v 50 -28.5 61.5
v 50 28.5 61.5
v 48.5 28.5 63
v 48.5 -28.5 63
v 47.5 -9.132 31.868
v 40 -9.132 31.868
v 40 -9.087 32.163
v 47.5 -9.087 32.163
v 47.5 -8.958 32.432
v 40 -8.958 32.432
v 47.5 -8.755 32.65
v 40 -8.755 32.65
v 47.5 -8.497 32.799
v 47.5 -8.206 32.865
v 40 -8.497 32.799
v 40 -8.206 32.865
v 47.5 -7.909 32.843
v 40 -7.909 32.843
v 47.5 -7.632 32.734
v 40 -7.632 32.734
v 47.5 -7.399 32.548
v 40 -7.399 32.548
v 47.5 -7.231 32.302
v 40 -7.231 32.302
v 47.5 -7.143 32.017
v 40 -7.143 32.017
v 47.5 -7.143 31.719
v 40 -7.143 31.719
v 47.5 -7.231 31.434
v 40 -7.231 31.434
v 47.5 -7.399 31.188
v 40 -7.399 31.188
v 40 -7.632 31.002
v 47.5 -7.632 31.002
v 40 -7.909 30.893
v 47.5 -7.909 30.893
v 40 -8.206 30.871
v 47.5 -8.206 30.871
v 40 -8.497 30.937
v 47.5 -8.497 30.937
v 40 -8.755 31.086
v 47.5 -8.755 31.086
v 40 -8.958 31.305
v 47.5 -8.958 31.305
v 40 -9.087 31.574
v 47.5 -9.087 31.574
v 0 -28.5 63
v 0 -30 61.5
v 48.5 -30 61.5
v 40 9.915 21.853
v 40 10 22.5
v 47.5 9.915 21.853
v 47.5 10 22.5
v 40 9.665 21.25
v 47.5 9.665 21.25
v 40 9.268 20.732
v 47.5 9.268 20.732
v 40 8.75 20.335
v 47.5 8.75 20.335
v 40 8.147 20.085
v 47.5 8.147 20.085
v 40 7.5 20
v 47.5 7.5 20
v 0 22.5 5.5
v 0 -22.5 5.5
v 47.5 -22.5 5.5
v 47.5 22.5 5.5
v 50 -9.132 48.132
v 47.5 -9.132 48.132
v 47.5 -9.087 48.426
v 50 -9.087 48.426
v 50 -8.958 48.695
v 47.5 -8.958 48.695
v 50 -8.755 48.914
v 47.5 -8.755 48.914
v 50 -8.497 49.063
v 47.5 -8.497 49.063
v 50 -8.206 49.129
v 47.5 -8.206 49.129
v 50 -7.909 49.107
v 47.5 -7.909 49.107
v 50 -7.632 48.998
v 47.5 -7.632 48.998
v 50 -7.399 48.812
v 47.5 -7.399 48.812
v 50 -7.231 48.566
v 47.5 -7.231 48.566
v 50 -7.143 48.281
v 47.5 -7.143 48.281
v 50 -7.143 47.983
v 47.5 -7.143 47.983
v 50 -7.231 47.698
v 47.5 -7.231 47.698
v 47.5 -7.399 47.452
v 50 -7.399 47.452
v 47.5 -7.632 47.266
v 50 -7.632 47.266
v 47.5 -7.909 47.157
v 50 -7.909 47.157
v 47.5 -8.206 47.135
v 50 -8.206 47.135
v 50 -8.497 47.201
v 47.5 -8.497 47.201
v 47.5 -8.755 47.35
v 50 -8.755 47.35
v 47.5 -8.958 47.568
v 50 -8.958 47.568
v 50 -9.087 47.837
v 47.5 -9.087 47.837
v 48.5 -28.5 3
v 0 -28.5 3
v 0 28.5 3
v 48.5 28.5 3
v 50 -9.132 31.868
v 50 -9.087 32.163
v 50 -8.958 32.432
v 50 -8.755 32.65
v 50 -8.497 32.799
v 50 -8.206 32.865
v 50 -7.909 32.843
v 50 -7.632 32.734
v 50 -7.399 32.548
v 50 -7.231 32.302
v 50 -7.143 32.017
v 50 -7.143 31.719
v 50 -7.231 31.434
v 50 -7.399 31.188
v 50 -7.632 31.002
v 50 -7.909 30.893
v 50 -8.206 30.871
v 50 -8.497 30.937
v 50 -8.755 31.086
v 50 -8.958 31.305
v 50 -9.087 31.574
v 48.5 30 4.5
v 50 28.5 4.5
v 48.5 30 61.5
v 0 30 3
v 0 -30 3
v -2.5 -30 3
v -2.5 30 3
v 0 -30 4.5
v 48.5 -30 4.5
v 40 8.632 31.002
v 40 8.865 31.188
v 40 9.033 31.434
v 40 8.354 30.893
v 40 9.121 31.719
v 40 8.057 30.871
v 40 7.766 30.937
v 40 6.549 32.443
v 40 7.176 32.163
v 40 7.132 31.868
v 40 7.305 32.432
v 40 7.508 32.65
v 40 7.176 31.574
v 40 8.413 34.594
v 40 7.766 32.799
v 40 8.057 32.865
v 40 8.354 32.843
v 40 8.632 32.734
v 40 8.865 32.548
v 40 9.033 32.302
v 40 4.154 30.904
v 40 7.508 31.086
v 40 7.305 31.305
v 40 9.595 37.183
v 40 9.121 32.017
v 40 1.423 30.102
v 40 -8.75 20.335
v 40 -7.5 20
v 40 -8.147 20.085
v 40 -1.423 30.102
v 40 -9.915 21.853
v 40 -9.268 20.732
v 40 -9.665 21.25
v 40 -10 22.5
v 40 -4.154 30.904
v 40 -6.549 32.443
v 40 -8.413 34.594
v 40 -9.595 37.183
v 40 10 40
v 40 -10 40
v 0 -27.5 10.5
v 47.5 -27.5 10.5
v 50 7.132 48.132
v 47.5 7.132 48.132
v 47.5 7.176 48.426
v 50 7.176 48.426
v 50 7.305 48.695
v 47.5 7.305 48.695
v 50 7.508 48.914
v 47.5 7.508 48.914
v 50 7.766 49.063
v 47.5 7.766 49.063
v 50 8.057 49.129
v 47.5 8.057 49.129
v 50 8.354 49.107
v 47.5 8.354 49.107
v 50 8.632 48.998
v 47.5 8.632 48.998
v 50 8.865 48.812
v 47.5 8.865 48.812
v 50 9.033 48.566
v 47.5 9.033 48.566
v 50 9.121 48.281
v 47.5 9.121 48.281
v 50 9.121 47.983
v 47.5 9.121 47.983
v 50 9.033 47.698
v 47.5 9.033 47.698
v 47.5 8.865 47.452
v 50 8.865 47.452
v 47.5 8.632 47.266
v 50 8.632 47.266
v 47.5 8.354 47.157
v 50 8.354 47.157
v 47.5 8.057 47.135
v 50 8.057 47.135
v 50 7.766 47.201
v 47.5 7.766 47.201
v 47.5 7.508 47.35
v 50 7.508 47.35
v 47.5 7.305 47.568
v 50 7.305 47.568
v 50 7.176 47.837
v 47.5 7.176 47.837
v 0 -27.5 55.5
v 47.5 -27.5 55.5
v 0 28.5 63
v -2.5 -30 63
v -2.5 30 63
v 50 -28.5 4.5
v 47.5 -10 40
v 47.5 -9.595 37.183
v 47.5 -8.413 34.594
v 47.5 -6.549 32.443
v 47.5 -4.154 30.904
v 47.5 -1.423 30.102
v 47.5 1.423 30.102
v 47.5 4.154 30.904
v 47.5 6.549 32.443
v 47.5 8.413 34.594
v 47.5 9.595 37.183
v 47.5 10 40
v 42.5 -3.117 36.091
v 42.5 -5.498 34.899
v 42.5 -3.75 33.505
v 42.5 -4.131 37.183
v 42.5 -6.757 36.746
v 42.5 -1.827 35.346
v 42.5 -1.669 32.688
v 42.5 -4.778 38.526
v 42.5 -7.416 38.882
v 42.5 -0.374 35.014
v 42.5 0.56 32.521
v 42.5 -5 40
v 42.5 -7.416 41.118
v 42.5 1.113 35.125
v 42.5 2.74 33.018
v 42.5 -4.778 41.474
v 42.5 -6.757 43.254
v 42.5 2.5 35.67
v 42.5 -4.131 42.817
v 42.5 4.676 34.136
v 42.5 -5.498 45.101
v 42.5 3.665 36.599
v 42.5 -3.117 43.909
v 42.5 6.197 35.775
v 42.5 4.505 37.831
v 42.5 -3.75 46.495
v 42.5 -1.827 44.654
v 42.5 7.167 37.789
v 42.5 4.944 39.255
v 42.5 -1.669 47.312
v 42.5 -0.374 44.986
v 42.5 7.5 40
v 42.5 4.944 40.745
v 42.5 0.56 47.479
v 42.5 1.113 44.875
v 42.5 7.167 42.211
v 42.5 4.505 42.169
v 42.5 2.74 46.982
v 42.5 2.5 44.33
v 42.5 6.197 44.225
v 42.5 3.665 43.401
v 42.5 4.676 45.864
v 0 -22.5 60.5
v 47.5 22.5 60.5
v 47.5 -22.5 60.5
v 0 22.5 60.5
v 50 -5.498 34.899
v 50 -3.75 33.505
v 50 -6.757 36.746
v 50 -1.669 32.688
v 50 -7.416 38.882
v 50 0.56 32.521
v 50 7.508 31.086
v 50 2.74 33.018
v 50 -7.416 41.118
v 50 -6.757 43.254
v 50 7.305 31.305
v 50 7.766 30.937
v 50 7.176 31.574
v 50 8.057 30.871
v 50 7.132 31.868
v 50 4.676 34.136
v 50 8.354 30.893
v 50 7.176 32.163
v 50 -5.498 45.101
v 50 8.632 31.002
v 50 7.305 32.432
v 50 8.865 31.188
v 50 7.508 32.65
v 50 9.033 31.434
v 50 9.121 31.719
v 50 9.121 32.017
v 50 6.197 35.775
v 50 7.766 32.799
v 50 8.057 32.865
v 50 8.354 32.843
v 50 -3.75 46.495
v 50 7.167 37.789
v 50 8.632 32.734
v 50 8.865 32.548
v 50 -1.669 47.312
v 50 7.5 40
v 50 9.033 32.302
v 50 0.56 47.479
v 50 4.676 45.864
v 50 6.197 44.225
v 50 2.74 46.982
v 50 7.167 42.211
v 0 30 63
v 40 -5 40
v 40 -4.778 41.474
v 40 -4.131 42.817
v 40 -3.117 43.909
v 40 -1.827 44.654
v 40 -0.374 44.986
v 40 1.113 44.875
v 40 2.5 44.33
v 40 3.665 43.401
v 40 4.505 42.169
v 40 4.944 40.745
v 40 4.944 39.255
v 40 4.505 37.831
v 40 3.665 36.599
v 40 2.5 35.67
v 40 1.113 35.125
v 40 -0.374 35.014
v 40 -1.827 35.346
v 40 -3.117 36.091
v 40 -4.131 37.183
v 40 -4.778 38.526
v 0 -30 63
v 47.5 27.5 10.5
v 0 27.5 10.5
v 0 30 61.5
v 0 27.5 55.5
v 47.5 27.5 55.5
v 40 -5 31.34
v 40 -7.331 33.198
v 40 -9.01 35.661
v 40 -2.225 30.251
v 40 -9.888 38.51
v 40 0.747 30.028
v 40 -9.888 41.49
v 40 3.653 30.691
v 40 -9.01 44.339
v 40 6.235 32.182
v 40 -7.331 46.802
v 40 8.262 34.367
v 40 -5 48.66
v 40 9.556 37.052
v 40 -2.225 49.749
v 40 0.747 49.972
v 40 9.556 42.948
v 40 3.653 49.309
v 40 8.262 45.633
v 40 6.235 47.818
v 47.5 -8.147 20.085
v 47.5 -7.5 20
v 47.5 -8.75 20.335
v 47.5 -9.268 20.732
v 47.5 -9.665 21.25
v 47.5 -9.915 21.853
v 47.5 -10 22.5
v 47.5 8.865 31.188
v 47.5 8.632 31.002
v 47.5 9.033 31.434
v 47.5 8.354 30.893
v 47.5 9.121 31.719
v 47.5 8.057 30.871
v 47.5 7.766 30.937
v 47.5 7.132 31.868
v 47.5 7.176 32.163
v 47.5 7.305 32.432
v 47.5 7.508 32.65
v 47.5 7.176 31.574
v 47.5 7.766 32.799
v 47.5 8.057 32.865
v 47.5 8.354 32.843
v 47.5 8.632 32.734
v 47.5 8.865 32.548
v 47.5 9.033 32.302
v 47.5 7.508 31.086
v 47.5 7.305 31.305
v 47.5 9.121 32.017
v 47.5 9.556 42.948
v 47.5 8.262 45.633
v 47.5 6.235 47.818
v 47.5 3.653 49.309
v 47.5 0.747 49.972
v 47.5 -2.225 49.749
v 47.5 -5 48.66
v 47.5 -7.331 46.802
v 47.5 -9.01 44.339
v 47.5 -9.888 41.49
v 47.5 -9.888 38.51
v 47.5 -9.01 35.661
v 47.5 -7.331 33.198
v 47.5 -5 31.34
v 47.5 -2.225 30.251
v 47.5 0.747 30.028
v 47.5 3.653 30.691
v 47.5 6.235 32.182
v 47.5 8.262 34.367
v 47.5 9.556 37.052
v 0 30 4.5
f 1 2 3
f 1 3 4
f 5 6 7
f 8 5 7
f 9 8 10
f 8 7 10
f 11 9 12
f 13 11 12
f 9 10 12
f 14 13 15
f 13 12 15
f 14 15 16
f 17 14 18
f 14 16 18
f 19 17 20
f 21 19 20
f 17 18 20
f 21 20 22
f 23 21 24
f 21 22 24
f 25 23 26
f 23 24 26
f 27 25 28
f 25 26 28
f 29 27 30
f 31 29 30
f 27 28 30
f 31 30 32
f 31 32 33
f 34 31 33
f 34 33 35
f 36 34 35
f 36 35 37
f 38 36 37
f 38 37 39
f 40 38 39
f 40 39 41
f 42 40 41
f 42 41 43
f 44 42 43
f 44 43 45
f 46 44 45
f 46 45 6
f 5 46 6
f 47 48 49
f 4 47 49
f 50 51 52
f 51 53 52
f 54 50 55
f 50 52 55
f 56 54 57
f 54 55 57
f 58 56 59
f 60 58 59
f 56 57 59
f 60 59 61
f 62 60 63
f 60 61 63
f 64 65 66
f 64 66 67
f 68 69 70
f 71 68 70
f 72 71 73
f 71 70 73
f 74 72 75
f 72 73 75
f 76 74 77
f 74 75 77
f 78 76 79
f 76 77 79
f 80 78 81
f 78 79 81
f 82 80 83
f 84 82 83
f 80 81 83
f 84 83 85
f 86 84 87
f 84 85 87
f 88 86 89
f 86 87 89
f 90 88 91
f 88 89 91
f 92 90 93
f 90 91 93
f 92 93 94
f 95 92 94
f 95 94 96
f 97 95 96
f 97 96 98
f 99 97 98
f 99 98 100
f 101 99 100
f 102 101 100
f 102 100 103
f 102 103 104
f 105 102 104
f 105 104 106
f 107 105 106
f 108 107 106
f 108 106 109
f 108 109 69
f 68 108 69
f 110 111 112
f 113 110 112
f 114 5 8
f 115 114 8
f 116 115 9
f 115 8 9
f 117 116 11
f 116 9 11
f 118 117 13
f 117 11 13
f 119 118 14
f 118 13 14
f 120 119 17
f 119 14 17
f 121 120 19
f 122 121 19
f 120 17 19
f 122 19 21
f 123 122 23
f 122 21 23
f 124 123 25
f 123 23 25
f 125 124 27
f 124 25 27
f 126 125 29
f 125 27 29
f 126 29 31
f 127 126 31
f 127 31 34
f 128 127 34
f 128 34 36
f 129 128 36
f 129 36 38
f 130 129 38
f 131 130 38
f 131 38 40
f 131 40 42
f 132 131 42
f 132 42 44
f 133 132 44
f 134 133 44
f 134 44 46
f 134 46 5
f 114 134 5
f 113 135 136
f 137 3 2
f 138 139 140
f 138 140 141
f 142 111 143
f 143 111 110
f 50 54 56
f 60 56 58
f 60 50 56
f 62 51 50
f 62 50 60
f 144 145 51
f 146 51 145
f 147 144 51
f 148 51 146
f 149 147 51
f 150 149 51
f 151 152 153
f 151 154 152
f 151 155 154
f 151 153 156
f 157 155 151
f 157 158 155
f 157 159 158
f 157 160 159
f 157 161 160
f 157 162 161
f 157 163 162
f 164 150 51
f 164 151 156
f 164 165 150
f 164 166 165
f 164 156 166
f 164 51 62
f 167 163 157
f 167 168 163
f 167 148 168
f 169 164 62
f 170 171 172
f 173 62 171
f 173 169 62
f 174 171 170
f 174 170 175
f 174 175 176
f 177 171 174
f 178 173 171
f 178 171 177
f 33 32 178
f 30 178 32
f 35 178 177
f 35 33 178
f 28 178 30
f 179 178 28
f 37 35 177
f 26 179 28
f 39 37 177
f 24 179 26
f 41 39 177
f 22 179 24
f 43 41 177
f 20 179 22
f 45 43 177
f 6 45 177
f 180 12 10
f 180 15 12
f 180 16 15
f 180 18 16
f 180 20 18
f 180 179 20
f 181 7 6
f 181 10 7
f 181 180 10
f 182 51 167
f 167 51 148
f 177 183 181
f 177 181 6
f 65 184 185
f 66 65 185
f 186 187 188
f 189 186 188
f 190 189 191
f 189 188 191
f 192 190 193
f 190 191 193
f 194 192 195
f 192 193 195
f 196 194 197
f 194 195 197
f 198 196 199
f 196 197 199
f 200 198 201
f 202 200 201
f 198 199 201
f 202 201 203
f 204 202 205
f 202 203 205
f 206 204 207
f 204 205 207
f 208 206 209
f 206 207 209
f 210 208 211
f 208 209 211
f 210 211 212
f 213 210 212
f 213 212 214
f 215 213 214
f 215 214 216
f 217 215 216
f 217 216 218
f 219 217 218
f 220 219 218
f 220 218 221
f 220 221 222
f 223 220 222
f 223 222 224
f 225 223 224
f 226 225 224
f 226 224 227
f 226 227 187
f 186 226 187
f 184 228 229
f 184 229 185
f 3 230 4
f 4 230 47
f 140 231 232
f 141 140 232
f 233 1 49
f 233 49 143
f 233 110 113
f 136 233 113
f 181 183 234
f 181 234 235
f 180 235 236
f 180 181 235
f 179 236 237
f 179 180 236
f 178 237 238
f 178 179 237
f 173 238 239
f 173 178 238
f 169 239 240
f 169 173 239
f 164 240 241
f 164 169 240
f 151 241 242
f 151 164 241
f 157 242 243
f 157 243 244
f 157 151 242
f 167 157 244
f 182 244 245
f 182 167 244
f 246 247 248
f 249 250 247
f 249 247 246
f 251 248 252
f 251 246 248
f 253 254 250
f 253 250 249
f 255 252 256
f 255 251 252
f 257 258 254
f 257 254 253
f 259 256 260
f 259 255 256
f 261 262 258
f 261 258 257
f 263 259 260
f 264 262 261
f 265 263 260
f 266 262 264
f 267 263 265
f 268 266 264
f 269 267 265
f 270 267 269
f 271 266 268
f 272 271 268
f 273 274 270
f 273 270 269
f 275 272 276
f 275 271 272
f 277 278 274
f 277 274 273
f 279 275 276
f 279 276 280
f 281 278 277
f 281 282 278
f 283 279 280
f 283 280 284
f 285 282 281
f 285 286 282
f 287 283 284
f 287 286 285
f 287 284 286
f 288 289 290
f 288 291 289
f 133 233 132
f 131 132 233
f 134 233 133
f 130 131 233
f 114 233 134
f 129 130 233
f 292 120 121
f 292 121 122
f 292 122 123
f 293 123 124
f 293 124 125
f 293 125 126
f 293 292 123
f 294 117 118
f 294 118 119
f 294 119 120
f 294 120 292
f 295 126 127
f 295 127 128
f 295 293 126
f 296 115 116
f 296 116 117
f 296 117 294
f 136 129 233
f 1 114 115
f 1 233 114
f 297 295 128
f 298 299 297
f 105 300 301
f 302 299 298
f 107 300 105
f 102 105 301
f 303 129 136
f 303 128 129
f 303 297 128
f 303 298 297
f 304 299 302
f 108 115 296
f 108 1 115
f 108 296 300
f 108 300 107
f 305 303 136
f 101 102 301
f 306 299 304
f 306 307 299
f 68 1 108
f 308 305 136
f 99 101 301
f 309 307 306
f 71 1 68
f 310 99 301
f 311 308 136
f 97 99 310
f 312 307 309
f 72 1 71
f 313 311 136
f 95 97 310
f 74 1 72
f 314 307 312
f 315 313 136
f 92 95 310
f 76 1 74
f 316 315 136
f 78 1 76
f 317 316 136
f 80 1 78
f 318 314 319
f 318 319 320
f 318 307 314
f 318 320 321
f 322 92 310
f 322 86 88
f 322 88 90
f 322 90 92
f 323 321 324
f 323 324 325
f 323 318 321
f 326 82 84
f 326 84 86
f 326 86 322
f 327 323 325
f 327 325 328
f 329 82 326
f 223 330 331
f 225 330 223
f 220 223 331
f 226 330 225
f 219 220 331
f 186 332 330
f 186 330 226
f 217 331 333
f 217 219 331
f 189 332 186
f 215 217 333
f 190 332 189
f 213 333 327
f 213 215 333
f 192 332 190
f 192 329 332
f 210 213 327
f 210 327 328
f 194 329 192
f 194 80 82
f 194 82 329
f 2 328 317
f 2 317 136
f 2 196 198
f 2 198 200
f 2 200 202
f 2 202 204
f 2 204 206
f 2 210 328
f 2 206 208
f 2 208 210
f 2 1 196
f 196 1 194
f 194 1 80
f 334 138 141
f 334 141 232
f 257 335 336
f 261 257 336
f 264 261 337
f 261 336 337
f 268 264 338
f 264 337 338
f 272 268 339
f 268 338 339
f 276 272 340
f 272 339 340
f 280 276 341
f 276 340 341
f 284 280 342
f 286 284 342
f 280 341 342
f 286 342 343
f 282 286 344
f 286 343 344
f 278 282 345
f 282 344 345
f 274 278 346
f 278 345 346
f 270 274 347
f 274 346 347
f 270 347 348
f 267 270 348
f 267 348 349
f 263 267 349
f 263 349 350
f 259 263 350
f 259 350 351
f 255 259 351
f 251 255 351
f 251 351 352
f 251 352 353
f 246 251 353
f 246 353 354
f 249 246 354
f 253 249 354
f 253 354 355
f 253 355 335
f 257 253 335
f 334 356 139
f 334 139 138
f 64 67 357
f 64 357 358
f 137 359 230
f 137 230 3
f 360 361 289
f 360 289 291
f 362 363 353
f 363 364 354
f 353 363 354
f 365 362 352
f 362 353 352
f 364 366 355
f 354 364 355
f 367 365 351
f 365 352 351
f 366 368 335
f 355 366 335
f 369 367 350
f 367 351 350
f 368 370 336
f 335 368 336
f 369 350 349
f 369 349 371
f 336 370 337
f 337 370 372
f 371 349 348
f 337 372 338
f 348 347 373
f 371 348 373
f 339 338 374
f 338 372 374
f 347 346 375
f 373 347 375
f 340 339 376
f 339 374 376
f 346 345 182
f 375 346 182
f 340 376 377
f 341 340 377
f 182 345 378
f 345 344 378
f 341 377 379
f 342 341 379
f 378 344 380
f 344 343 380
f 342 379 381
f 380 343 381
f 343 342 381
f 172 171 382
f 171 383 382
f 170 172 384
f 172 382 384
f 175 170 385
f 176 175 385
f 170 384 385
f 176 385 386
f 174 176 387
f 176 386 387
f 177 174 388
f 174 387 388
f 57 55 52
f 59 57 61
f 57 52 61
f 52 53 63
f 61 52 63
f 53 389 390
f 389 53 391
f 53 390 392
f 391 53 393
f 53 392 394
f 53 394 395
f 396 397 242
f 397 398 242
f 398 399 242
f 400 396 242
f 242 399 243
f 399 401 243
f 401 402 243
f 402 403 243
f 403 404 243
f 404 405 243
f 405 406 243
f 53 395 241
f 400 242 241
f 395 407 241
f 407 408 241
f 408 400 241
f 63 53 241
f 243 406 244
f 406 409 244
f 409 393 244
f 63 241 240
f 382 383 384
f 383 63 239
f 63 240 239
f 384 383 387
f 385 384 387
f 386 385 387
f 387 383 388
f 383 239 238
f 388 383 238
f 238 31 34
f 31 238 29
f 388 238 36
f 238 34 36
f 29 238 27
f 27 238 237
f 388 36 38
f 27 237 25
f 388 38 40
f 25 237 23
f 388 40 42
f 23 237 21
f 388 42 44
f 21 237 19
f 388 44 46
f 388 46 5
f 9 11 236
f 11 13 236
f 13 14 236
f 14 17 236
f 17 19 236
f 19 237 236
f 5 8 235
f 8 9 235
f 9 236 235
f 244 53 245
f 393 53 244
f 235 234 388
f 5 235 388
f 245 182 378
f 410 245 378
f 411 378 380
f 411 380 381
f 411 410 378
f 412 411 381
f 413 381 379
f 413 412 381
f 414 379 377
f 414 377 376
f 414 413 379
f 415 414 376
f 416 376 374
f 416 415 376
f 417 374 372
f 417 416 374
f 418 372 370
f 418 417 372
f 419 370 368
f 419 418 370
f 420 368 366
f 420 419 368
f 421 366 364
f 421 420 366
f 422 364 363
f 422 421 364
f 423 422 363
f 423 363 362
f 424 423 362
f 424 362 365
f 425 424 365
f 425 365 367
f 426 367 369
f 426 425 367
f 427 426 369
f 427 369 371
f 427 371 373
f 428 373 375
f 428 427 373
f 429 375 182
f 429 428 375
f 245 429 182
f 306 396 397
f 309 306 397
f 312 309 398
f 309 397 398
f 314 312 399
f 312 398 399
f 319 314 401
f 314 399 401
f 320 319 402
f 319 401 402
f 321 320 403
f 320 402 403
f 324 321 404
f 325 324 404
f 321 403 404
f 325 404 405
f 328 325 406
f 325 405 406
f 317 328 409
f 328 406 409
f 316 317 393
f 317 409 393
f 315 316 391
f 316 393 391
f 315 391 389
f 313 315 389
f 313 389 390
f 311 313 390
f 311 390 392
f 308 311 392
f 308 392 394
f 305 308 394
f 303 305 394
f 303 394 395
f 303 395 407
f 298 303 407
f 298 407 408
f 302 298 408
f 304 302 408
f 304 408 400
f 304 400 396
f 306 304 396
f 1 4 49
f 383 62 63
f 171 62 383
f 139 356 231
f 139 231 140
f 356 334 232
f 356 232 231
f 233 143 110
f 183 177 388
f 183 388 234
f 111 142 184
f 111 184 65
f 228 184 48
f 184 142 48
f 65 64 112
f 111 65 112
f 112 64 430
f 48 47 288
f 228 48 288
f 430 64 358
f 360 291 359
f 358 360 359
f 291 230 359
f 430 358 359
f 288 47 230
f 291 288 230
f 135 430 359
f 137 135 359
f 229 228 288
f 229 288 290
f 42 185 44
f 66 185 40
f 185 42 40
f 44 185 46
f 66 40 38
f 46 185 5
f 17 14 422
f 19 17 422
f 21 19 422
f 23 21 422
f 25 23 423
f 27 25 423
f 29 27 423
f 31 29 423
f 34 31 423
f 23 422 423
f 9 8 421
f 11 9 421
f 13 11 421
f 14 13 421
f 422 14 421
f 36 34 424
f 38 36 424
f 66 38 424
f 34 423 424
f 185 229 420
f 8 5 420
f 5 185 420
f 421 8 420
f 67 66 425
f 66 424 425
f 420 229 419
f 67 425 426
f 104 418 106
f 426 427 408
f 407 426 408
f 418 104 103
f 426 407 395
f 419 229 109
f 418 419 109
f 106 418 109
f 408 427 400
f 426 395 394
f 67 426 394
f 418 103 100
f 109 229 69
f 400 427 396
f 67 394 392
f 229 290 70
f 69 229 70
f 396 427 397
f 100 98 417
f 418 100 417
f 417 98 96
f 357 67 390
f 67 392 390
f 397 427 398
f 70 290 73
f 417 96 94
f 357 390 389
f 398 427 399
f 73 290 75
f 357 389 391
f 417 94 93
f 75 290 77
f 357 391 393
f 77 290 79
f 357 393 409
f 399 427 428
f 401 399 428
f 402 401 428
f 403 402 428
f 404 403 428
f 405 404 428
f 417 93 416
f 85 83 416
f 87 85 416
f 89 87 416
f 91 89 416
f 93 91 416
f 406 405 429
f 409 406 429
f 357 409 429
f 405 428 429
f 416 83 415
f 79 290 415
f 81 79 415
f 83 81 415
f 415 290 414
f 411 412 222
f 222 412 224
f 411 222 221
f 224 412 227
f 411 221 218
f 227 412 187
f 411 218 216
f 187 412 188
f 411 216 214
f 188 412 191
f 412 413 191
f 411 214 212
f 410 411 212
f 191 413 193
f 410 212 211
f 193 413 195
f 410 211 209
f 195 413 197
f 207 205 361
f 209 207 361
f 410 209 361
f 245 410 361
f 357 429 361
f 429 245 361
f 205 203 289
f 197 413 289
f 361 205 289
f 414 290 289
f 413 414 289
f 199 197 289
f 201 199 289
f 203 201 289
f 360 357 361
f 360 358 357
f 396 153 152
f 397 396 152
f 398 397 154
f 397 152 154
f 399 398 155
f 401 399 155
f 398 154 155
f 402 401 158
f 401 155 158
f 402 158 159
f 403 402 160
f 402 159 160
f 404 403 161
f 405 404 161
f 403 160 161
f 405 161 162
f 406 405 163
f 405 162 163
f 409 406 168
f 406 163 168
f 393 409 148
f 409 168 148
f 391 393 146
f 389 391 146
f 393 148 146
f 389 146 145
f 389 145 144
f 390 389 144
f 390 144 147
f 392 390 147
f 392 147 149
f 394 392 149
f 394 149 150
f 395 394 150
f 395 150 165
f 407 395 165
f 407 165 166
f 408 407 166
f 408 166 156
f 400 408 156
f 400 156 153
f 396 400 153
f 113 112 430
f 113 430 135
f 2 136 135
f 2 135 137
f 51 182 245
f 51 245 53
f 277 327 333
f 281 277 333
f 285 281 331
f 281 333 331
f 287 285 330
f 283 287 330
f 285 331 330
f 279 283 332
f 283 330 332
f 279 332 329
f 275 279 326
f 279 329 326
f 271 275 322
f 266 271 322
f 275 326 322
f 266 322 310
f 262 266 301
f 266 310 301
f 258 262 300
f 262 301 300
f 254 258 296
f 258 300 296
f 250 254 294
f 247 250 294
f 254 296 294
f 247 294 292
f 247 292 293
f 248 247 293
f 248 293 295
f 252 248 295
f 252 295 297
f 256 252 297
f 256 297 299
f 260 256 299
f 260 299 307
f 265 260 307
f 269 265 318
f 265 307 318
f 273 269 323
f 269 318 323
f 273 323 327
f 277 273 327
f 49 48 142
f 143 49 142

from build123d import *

# Parameters (mm, degrees)
F1_DEPTH  = 50
F2_R      = 7.5
F3_DEPTH  = 7.5
F4_T      = -2.5
F5_DEPTH  = 2.5
F6_R      = 5
F7_DEPTH  = 25
F9_SIZE   = 1.5
F10_DEPTH = 7.5
F11_SIZE  = 5
F12_R     = 2.5
F14_D     = 2
F14_2_D   = 2


with BuildPart() as f1:
    # F0 (on Right) → F1 (new body)
    with BuildSketch(Plane.YZ):
        Polygon((30, 63), (-30, 63), (-30, 3), (0, 3), (30, 3), align=None)
    extrude(amount=F1_DEPTH)

    # F2 (on face) → F3 (cut)
    with BuildSketch(Plane.YZ.offset(50)):
        with Locations((0, 40)):
            Circle(F2_R)
    extrude(amount=-F3_DEPTH, mode=Mode.SUBTRACT)

    # F4
    f4_openings = [f1.faces().sort_by_distance(p)[0] for p in [
        (0, 0, 33),
    ]]
    offset(amount=F4_T, openings=f4_openings, kind=Kind.INTERSECTION)

    # F6 (on face) → F7 (cut)
    with BuildSketch(Plane(origin=(40, 0, 0), x_dir=(0, -1, 0), z_dir=(-1, 0, 0))):
        with Locations((0, 40)):
            Circle(F6_R)
    extrude(amount=-F7_DEPTH, mode=Mode.SUBTRACT)

    # F9
    f9_edges = [f1.edges().sort_by_distance(p)[0] for p in [
        (25, 30, 3),
        (25, 30, 63),
        (25, -30, 3),
        (25, -30, 63),
        (50, 0, 63),
        (50, -30, 33),
        (50, 30, 33),
        (50, 0, 3),
    ]]
    chamfer(f9_edges, length=F9_SIZE)

    # F11
    f11_edges = [f1.edges().sort_by_distance(p)[0] for p in [
        (23.75, 27.5, 5.5),
        (23.75, -27.5, 5.5),
        (23.75, -27.5, 60.5),
        (23.75, 27.5, 60.5),
    ]]
    chamfer(f11_edges, length=F11_SIZE)

    # F14 (through all)
    with Locations(Plane.YZ.offset(50)):
        with Locations((8.1317279836, 48.1317279836), (8.1317279836, 31.8682720164), (-8.1317279836, 31.8682720164), (-8.1317279836, 48.1317279836)):
            Hole(F14_D / 2)


with BuildPart() as f5:
    # F0 (on Right) → F5 (new body)
    with BuildSketch(Plane.YZ):
        Polygon((30, 63), (-30, 63), (-30, 3), (0, 3), (30, 3), align=None)
    extrude(amount=-F5_DEPTH)


with BuildPart() as f10:
    # F8 (on face) → F10 (new body, through all)
    with BuildSketch(Plane(origin=(40, 0, 0), x_dir=(0, -1, 0), z_dir=(-1, 0, 0))):
        with BuildLine():
            ThreePointArc((10, 40), (0, 30), (-10, 40))
            Line((-10, 40), (-10, 20))
            Line((-10, 20), (10, 20))
            Line((10, 20), (10, 40))
        make_face()
    extrude(amount=-F10_DEPTH)

    # F12
    f12_edges = [f10.edges().sort_by_distance(p)[0] for p in [
        (43.75, -10, 20),
        (43.75, 10, 20),
    ]]
    fillet(f12_edges, radius=F12_R)

    # F14#2 (through all)
    with Locations(Plane.YZ.offset(50)):
        with Locations((8.1317279836, 48.1317279836), (8.1317279836, 31.8682720164), (-8.1317279836, 31.8682720164), (-8.1317279836, 48.1317279836)):
            Hole(F14_2_D / 2)


solid = Compound([f1.part, f5.part, f10.part])
